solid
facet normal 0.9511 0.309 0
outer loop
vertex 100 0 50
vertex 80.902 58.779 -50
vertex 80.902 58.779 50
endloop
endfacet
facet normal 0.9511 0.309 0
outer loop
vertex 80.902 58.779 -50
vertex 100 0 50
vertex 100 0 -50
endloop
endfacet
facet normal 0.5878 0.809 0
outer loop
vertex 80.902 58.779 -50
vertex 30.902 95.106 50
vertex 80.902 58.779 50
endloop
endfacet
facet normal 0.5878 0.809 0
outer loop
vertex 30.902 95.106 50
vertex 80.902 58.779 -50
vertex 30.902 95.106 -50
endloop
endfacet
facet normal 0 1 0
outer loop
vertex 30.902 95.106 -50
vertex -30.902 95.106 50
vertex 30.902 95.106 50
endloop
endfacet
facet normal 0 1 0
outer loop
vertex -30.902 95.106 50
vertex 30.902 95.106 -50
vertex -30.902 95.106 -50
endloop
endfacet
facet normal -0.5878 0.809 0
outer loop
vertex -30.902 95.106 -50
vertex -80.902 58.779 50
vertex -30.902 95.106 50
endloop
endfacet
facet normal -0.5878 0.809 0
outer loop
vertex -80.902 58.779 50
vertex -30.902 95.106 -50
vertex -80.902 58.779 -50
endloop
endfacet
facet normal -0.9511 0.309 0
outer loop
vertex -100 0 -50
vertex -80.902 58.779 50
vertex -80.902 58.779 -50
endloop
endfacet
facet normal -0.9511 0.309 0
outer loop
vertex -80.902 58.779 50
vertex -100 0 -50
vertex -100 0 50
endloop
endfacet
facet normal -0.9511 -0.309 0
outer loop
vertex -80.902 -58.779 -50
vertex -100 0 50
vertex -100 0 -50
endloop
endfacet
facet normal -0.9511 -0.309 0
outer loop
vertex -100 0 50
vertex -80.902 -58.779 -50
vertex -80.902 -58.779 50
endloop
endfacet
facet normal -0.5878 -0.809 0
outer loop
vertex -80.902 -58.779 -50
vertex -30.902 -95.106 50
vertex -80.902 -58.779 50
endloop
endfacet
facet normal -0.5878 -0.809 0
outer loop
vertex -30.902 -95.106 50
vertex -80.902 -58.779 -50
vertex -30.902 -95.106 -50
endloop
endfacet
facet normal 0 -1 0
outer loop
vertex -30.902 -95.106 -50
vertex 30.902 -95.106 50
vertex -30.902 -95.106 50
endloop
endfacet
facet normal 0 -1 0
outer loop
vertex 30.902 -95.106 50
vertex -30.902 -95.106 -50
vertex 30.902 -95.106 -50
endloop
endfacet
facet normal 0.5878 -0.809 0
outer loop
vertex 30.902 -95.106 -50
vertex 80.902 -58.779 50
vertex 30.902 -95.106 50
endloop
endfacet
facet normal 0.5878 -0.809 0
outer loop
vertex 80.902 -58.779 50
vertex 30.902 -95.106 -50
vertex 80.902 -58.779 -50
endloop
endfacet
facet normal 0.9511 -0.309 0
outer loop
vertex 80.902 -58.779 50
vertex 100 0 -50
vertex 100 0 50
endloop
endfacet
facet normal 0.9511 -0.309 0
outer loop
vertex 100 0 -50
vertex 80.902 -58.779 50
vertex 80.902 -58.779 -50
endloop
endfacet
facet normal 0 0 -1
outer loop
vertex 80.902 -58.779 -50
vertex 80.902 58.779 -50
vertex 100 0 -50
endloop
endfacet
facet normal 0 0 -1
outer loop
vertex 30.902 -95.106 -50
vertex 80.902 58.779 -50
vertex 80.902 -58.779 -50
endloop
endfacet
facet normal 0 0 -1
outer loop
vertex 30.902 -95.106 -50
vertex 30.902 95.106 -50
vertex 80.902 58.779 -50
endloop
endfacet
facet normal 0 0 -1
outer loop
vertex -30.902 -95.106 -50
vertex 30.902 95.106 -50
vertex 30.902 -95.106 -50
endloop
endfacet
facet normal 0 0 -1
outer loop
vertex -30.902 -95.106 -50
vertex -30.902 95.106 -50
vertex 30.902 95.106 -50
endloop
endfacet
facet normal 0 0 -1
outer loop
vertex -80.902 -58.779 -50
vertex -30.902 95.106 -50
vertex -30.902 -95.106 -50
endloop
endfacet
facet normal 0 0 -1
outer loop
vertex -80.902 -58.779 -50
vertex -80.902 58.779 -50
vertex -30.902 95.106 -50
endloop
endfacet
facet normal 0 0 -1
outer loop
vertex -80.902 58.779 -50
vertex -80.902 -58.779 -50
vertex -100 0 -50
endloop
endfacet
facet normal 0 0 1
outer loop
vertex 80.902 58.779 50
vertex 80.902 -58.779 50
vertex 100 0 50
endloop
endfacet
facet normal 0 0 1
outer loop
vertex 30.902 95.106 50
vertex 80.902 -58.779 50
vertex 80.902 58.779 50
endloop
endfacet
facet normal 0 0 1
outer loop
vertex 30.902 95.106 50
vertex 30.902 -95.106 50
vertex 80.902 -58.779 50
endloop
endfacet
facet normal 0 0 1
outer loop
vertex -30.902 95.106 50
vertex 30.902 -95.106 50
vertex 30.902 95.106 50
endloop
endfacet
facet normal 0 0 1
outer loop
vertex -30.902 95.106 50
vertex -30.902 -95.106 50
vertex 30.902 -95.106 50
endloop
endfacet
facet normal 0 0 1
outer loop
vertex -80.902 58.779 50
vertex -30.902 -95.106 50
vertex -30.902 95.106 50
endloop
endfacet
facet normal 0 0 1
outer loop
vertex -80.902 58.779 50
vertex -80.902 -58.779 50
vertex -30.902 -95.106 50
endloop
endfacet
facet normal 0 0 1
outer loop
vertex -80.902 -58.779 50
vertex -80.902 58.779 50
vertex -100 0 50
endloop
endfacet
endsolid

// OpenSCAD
// cylinder.scad
$fn = 10;  // Resolution of the cylinder (number of facets)

diameter = 200;   // Diameter in mm
height = 100;     // Height in mm (adjust as needed)

// Create a cylinder centered at the origin
cylinder(h = height, d = diameter, center = true);
